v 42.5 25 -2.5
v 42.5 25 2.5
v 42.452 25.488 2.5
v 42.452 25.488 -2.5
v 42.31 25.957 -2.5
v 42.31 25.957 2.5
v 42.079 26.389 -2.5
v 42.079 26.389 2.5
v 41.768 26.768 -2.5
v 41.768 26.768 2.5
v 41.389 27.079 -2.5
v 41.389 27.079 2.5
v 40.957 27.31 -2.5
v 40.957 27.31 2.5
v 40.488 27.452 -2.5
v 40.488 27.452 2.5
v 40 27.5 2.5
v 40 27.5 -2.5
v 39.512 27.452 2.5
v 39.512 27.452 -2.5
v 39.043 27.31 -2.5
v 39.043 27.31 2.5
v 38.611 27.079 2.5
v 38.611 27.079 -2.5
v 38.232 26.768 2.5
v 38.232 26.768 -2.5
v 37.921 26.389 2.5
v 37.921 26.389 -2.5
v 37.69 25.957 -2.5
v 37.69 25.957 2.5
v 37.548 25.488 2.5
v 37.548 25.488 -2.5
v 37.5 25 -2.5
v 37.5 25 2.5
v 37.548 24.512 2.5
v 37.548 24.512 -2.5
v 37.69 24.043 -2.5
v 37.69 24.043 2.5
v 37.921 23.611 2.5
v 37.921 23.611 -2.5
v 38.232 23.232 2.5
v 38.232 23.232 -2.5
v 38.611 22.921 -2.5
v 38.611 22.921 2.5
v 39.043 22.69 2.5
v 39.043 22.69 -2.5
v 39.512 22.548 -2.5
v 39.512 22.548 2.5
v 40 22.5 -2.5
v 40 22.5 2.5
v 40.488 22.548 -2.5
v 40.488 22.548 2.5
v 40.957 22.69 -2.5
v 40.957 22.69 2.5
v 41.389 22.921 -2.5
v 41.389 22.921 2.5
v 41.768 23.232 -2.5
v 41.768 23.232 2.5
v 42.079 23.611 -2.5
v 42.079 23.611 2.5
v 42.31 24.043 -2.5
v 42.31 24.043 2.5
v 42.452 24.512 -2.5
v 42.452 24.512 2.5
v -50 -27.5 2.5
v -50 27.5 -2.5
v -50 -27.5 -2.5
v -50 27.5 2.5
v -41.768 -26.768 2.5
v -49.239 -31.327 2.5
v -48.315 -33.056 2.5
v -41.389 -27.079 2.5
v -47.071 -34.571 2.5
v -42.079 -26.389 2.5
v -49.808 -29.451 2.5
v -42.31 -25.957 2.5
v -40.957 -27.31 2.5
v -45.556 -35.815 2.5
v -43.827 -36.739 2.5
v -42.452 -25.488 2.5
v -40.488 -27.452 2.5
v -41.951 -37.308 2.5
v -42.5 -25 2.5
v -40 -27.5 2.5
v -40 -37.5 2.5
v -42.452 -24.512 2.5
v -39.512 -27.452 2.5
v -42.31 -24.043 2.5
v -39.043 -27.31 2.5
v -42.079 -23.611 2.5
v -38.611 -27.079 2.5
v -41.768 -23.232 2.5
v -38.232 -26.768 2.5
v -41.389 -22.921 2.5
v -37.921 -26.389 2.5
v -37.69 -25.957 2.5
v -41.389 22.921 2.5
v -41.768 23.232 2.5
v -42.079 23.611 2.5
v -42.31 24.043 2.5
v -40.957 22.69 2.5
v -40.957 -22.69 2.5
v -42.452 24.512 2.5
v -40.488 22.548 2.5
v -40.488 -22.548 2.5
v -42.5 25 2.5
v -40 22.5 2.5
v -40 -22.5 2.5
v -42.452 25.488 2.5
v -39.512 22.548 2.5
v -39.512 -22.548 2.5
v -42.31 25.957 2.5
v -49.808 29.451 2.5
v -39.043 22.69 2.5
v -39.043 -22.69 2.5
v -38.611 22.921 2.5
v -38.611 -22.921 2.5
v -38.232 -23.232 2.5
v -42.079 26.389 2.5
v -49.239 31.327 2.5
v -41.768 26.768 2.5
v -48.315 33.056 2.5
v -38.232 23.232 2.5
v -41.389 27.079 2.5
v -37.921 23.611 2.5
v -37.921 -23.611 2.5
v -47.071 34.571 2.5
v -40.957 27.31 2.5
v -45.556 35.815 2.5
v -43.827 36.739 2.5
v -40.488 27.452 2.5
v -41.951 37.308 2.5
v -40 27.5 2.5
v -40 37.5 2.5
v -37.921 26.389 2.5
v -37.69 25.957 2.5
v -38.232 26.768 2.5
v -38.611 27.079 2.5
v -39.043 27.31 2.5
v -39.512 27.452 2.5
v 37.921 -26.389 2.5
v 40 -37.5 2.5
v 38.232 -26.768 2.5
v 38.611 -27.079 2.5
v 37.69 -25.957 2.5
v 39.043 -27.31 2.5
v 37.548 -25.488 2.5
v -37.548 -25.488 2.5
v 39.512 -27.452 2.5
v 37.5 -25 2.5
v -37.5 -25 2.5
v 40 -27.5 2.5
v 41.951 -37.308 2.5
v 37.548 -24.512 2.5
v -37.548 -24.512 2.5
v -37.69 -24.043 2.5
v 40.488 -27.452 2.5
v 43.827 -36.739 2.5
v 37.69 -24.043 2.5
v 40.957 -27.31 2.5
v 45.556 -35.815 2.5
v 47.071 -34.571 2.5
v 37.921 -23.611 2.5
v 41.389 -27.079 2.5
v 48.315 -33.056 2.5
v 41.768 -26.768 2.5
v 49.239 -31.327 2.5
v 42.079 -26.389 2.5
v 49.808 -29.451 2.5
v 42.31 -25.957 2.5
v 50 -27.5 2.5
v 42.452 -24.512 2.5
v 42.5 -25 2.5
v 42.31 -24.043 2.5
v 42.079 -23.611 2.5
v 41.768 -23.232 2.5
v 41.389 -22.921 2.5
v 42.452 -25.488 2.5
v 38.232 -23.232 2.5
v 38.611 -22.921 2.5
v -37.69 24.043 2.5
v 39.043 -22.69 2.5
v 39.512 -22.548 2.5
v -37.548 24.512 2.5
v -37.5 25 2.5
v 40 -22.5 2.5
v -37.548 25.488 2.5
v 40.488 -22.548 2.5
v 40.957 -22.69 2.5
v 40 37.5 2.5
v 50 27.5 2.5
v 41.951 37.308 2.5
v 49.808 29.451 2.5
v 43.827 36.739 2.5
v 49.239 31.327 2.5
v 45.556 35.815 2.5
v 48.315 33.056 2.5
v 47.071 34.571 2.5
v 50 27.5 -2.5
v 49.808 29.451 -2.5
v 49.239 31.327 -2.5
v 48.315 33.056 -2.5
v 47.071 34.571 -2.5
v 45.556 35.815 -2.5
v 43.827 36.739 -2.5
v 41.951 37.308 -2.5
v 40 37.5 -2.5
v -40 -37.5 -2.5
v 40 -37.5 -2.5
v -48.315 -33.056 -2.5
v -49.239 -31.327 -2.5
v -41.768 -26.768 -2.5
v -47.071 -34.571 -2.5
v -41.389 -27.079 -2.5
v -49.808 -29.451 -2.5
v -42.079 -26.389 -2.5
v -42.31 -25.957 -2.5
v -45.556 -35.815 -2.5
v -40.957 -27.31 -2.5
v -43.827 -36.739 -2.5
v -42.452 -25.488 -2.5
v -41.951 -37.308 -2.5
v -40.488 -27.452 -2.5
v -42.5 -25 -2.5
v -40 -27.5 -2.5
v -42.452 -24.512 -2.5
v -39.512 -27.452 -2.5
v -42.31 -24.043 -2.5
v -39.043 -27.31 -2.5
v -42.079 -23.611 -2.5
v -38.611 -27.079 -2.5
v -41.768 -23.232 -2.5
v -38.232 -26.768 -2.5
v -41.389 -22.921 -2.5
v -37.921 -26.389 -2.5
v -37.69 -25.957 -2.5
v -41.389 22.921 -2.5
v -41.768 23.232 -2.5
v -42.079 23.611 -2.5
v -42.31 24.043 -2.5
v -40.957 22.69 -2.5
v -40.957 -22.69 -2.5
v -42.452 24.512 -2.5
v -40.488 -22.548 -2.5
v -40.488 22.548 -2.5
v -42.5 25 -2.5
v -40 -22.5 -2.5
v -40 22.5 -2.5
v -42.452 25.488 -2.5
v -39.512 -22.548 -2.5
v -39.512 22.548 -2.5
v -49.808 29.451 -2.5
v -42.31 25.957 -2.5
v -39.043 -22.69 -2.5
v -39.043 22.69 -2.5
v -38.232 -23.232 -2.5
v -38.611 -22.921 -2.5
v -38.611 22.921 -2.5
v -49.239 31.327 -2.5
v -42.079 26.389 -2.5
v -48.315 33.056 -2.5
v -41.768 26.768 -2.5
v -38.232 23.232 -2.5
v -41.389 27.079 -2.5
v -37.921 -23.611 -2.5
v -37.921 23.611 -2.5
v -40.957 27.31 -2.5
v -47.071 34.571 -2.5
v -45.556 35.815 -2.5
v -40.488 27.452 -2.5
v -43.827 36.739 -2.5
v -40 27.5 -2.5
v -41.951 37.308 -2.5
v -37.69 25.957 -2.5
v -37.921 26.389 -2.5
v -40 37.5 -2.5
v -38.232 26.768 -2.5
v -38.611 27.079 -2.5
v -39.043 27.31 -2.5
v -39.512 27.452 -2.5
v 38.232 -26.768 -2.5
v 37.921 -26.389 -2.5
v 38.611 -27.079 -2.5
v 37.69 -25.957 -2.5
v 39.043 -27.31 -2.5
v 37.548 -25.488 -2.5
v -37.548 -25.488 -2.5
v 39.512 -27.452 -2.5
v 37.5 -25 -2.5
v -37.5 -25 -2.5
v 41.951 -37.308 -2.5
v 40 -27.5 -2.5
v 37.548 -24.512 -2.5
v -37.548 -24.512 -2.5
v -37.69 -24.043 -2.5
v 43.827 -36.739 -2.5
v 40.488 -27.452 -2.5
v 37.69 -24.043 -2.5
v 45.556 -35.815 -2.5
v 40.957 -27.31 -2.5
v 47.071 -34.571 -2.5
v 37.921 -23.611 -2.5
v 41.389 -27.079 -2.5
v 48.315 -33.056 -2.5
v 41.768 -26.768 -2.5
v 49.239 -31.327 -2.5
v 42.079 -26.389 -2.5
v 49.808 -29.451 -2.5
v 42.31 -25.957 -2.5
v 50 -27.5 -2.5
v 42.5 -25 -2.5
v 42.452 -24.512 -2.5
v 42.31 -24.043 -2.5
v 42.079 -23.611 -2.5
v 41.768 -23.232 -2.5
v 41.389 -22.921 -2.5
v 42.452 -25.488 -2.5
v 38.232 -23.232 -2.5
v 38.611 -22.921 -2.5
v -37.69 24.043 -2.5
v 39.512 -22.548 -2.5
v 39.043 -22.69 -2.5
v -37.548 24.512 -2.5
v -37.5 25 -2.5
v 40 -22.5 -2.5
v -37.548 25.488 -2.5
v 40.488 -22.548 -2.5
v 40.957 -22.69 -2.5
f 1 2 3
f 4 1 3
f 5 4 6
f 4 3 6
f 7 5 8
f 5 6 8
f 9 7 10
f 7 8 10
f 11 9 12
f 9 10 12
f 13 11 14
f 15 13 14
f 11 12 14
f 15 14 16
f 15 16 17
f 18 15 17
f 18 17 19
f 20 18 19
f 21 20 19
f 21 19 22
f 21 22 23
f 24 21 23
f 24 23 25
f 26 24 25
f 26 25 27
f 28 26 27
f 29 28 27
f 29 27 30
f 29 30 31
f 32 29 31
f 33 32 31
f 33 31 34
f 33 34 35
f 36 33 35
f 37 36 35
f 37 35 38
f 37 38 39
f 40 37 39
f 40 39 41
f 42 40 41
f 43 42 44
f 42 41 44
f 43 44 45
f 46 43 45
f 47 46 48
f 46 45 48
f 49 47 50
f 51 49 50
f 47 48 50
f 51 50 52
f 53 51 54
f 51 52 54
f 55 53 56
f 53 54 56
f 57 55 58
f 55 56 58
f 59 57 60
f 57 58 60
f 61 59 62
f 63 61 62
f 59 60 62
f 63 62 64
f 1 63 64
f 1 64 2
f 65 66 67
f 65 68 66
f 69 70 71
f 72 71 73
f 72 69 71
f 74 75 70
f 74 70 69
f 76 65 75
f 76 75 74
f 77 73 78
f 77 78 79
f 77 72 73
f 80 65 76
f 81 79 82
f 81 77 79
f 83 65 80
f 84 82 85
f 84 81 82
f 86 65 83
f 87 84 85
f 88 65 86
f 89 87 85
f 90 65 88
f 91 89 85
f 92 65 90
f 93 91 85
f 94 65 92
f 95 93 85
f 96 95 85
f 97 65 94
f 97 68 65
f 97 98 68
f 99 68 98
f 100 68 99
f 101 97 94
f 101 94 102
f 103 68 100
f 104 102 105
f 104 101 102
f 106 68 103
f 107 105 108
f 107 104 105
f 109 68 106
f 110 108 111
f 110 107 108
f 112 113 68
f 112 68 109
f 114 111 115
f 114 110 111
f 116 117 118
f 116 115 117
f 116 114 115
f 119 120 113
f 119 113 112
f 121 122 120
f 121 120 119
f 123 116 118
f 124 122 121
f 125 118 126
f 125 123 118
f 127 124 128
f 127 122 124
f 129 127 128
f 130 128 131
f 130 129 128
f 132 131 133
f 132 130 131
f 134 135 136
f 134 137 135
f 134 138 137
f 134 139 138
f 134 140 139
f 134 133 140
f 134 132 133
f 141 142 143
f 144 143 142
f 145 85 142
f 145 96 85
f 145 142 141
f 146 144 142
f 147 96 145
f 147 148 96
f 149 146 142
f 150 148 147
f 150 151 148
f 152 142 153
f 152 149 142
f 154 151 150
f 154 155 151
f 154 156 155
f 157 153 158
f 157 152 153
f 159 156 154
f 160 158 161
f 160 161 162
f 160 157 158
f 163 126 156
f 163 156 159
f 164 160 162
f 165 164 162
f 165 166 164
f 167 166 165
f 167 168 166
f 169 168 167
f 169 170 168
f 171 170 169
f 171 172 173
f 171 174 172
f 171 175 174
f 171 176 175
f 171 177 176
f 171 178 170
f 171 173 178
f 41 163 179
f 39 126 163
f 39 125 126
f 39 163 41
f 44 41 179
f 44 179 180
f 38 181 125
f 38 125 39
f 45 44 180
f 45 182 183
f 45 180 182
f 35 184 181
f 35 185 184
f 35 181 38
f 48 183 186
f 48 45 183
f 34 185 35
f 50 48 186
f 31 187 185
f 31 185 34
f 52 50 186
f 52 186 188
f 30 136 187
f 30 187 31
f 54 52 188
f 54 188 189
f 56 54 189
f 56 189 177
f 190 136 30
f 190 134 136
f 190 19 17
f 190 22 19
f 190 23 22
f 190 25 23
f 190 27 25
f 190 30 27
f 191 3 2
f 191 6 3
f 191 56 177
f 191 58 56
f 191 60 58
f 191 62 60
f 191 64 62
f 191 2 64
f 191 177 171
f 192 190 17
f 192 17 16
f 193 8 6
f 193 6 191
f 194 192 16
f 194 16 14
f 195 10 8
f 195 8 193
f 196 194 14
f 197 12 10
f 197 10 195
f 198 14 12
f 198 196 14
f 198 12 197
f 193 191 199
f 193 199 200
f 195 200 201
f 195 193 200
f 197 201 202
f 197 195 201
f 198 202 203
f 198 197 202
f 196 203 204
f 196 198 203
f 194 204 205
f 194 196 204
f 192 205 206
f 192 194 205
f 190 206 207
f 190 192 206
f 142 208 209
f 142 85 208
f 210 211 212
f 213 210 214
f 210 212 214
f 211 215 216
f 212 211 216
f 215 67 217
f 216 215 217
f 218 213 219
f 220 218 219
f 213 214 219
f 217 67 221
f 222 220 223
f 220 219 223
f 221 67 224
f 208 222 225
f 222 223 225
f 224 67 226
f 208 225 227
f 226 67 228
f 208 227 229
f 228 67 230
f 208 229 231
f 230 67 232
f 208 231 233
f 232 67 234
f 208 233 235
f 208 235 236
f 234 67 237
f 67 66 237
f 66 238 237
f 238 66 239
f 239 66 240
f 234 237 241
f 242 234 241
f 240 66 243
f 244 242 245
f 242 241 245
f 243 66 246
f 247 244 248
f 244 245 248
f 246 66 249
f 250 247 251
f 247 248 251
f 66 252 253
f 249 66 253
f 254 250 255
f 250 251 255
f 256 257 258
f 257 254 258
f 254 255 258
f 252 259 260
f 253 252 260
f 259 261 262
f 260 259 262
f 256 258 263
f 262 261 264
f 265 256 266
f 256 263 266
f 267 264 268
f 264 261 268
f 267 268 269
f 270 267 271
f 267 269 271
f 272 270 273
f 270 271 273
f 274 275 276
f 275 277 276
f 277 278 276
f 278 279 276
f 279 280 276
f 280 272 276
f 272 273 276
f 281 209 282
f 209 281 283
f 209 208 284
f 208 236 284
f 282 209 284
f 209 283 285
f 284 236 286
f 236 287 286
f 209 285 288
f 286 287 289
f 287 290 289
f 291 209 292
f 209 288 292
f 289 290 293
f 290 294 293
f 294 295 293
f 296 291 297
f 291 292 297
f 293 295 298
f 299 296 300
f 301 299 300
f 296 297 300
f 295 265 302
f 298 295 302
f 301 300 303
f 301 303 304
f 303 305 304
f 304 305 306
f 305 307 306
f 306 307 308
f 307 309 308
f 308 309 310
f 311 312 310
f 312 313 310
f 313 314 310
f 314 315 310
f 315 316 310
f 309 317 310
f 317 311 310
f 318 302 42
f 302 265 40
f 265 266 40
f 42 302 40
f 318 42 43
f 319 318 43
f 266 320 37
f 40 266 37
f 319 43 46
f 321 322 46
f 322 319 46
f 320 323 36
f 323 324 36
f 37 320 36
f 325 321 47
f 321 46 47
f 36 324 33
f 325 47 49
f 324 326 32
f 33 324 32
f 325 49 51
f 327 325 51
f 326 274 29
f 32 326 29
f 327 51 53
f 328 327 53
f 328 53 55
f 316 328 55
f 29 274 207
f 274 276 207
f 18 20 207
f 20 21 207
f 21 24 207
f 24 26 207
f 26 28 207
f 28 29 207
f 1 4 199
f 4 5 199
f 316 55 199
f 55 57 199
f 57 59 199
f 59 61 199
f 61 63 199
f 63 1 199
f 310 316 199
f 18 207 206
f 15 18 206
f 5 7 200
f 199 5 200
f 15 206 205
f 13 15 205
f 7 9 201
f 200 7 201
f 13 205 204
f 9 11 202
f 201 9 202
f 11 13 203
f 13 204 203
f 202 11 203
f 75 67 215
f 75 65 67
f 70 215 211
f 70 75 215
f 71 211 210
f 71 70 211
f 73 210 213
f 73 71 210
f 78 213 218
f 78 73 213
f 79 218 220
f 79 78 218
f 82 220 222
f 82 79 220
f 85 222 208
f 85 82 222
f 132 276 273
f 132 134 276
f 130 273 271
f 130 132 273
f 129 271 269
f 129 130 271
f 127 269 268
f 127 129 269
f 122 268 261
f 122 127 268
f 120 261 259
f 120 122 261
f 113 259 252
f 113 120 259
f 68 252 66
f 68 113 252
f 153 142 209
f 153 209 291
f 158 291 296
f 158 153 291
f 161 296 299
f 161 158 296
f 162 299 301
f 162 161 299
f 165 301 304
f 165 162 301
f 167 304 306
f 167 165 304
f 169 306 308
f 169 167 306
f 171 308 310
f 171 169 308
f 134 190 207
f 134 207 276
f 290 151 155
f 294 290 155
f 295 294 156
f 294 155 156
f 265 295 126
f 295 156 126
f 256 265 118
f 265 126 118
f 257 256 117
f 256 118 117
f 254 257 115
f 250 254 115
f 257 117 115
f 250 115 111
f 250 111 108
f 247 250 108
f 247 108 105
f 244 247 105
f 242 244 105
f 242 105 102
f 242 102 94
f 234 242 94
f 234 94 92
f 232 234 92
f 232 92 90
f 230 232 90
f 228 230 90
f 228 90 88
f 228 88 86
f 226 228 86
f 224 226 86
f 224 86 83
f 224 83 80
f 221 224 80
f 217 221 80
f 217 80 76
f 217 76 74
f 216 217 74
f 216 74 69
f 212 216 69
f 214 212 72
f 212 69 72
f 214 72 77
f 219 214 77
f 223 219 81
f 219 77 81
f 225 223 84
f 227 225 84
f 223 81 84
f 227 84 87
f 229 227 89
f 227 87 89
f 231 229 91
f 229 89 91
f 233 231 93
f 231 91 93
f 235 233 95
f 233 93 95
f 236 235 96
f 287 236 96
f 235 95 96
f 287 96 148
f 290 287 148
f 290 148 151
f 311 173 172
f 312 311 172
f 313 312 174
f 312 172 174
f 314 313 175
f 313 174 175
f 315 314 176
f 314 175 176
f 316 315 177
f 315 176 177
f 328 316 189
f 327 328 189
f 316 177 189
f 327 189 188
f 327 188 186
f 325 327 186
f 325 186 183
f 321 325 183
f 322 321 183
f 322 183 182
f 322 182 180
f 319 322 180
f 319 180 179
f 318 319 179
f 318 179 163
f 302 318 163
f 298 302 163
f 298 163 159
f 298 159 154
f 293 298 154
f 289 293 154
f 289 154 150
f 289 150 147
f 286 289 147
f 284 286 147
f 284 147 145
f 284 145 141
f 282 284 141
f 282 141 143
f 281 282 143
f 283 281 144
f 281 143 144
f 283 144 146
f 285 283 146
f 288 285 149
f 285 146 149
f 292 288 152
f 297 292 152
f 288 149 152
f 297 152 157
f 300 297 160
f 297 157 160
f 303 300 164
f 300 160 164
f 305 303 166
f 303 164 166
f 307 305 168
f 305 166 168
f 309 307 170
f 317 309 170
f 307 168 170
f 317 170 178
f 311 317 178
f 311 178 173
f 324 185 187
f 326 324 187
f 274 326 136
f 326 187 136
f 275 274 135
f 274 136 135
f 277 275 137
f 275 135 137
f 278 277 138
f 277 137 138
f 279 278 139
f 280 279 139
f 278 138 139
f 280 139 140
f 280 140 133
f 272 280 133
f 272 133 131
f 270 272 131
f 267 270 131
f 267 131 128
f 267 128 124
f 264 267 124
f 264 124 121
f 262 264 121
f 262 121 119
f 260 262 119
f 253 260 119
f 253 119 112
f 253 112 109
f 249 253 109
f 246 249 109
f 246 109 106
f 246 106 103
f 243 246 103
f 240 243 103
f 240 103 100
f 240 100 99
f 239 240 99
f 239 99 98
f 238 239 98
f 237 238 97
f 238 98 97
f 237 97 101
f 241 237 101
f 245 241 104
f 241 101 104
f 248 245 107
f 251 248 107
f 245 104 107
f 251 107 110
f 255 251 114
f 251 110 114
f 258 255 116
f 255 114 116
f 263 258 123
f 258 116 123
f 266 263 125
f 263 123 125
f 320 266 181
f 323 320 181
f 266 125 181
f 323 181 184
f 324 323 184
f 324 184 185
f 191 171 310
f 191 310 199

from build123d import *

# Parameters (mm, degrees)
SKETCH1_R           = 12.5
BOSS_EXTRUDE1_DEPTH = 2.5
SKETCH2_R           = 2.5
CUT_EXTRUDE1_DEPTH  = 63.69968102
SKETCH5_R           = 12.5
BOSS_EXTRUDE2_DEPTH = 2.5


with BuildPart() as part:
    # Sketch1 → Boss-Extrude1 (new, symmetric)
    with BuildSketch(Plane.XY):
        with BuildLine():
            Line((-40, -37.5), (40, -37.5))
            ThreePointArc((40, -37.5), (47.071067812, -34.571067812), (50, -27.5))
            Line((50, -27.5), (50, 27.5))
            ThreePointArc((50, 27.5), (47.071067812, 34.571067812), (40, 37.5))
            Line((40, 37.5), (-40, 37.5))
            ThreePointArc((-40, 37.5), (-47.071067812, 34.571067812), (-50, 27.5))
            Line((-50, 27.5), (-50, -27.5))
            ThreePointArc((-50, -27.5), (-47.071067812, -34.571067812), (-40, -37.5))
        make_face()
        Circle(SKETCH1_R, mode=Mode.SUBTRACT)
    extrude(amount=BOSS_EXTRUDE1_DEPTH, both=True)

    # Sketch2 → Cut-Extrude1 (cut, through all)
    with BuildSketch(Plane.XY.offset(2.5)):
        with Locations((40, 25)):
            Circle(SKETCH2_R)
        with Locations((-40, 25)):
            Circle(SKETCH2_R)
        with Locations((-40, -25)):
            Circle(SKETCH2_R)
        with Locations((40, -25)):
            Circle(SKETCH2_R)
    extrude(amount=-CUT_EXTRUDE1_DEPTH, mode=Mode.SUBTRACT)

    # Sketch5 → Boss-Extrude2 (add, symmetric)
    with BuildSketch(Plane.XY):
        Circle(SKETCH5_R)
    extrude(amount=BOSS_EXTRUDE2_DEPTH, both=True)


solid = part.part
